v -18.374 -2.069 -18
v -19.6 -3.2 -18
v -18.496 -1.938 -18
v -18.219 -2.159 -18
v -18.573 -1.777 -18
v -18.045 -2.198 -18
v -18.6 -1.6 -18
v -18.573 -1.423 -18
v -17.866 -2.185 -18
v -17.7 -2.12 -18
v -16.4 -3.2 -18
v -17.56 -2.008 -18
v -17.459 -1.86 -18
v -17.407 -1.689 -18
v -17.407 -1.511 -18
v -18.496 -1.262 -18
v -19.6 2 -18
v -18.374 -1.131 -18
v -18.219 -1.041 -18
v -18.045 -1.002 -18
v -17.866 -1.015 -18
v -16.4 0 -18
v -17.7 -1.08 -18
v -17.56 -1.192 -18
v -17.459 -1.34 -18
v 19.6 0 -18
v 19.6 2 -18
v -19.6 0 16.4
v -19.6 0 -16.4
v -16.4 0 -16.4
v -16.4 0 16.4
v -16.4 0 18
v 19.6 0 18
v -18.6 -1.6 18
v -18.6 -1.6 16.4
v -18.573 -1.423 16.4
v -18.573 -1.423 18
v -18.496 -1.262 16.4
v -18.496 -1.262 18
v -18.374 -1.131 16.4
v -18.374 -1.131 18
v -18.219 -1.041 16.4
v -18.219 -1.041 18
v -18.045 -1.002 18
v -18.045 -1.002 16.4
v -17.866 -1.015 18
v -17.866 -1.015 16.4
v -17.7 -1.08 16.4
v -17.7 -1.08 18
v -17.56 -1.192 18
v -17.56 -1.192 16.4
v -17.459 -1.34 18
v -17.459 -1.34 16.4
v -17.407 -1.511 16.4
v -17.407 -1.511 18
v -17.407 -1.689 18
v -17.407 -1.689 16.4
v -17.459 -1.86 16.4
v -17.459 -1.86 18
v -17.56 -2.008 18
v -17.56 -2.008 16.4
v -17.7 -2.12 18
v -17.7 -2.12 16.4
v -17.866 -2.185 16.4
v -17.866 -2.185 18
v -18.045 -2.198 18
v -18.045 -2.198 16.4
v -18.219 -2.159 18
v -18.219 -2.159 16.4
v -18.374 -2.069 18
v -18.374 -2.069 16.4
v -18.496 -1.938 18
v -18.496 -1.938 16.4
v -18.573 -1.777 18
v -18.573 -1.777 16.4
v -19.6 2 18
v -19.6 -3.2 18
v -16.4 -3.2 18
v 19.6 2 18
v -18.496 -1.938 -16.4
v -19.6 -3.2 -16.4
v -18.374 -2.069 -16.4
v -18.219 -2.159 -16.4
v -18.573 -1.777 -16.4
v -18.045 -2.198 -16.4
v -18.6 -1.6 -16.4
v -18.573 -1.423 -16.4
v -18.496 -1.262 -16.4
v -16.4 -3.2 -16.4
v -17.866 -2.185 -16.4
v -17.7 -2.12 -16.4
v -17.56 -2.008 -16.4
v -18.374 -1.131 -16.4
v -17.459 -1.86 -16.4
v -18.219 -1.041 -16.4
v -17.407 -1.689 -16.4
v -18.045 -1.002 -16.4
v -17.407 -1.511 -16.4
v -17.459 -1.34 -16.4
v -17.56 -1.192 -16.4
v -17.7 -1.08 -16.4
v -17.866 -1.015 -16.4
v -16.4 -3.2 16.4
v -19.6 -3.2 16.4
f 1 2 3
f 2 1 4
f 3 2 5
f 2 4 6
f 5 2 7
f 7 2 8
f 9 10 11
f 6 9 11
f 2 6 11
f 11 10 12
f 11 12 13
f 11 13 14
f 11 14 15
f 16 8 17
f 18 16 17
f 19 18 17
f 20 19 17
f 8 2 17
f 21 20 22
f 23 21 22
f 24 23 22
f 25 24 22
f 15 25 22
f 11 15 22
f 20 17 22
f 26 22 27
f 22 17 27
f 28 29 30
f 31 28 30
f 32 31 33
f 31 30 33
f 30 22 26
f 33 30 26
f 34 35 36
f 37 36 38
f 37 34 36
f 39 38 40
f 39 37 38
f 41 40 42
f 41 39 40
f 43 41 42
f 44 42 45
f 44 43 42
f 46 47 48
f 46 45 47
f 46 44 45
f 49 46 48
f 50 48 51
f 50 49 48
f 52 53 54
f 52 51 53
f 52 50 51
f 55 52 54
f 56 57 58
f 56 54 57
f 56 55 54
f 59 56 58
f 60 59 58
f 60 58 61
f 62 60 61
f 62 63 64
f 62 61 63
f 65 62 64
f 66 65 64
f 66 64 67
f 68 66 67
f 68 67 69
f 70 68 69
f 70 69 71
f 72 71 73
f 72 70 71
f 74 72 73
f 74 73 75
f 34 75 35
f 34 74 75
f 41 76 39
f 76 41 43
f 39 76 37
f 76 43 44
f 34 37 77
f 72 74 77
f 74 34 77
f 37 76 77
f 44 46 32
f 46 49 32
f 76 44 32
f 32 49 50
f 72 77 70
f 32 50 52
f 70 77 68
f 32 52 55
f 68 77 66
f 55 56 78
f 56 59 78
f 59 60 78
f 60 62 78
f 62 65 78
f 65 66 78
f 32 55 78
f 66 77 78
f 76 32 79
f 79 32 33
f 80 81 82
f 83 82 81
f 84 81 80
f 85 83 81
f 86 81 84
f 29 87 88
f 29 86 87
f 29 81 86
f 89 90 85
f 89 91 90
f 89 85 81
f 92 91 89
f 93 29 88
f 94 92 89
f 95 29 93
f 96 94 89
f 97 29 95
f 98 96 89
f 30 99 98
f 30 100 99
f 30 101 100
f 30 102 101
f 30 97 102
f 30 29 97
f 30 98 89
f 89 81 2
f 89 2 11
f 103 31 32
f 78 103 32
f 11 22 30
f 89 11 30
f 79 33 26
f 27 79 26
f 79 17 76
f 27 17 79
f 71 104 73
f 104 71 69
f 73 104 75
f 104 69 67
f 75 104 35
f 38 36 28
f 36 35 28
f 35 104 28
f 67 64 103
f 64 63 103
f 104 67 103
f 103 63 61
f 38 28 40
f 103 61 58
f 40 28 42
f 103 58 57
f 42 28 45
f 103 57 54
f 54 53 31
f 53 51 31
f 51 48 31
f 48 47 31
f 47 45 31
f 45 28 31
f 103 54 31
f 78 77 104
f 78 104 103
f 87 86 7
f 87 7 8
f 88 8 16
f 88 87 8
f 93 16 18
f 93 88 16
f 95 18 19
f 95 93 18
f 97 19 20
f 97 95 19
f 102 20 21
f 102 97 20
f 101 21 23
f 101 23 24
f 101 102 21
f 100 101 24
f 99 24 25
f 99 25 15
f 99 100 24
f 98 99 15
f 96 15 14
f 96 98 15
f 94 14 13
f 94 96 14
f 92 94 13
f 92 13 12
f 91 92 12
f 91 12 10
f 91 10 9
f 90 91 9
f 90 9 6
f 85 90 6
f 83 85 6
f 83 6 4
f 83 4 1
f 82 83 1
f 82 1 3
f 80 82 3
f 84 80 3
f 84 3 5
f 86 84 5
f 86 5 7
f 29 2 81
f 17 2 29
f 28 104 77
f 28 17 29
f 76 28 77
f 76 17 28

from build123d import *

# Parameters (mm, degrees)
SKETCH_1_W          = 39.2
SKETCH_1_H          = 36
EXTRUDE_1_DEPTH     = 2
SKETCH_7_W          = 3.2
SKETCH_7_H          = 1.6
EXTRUDE_3_DEPTH     = 3.2
CUT_EXTRUDE_START   = -36
SKETCH_8_R          = 0.6
CUT_EXTRUDE_2_DEPTH = 36


with BuildPart() as part:
    # Эскиз1 → Бобышка-Вытянуть1 (new body)
    with BuildSketch(Plane(origin=(0, 0, 0), x_dir=(1, 0, 0), z_dir=(0, 1, 0))):
        Rectangle(SKETCH_1_W, SKETCH_1_H)
    extrude(amount=EXTRUDE_1_DEPTH)

    # Эскиз7 → Бобышка-Вытянуть3 (add)
    with BuildSketch(Plane.XZ):
        with Locations((-18, -17.2)):
            Rectangle(SKETCH_7_W, SKETCH_7_H)
        with Locations((-18, 17.2)):
            Rectangle(SKETCH_7_W, SKETCH_7_H)
    extrude(amount=EXTRUDE_3_DEPTH)

    # Эскиз8 → Вырез-Вытянуть2 (cut)
    with BuildSketch(Plane(origin=(0, 0, -18), x_dir=(-1, 0, 0), z_dir=(0, 0, -1)).offset(CUT_EXTRUDE_START)):
        with Locations((18, -1.6)):
            Circle(SKETCH_8_R)
    extrude(amount=CUT_EXTRUDE_2_DEPTH, mode=Mode.SUBTRACT)


solid = part.part
